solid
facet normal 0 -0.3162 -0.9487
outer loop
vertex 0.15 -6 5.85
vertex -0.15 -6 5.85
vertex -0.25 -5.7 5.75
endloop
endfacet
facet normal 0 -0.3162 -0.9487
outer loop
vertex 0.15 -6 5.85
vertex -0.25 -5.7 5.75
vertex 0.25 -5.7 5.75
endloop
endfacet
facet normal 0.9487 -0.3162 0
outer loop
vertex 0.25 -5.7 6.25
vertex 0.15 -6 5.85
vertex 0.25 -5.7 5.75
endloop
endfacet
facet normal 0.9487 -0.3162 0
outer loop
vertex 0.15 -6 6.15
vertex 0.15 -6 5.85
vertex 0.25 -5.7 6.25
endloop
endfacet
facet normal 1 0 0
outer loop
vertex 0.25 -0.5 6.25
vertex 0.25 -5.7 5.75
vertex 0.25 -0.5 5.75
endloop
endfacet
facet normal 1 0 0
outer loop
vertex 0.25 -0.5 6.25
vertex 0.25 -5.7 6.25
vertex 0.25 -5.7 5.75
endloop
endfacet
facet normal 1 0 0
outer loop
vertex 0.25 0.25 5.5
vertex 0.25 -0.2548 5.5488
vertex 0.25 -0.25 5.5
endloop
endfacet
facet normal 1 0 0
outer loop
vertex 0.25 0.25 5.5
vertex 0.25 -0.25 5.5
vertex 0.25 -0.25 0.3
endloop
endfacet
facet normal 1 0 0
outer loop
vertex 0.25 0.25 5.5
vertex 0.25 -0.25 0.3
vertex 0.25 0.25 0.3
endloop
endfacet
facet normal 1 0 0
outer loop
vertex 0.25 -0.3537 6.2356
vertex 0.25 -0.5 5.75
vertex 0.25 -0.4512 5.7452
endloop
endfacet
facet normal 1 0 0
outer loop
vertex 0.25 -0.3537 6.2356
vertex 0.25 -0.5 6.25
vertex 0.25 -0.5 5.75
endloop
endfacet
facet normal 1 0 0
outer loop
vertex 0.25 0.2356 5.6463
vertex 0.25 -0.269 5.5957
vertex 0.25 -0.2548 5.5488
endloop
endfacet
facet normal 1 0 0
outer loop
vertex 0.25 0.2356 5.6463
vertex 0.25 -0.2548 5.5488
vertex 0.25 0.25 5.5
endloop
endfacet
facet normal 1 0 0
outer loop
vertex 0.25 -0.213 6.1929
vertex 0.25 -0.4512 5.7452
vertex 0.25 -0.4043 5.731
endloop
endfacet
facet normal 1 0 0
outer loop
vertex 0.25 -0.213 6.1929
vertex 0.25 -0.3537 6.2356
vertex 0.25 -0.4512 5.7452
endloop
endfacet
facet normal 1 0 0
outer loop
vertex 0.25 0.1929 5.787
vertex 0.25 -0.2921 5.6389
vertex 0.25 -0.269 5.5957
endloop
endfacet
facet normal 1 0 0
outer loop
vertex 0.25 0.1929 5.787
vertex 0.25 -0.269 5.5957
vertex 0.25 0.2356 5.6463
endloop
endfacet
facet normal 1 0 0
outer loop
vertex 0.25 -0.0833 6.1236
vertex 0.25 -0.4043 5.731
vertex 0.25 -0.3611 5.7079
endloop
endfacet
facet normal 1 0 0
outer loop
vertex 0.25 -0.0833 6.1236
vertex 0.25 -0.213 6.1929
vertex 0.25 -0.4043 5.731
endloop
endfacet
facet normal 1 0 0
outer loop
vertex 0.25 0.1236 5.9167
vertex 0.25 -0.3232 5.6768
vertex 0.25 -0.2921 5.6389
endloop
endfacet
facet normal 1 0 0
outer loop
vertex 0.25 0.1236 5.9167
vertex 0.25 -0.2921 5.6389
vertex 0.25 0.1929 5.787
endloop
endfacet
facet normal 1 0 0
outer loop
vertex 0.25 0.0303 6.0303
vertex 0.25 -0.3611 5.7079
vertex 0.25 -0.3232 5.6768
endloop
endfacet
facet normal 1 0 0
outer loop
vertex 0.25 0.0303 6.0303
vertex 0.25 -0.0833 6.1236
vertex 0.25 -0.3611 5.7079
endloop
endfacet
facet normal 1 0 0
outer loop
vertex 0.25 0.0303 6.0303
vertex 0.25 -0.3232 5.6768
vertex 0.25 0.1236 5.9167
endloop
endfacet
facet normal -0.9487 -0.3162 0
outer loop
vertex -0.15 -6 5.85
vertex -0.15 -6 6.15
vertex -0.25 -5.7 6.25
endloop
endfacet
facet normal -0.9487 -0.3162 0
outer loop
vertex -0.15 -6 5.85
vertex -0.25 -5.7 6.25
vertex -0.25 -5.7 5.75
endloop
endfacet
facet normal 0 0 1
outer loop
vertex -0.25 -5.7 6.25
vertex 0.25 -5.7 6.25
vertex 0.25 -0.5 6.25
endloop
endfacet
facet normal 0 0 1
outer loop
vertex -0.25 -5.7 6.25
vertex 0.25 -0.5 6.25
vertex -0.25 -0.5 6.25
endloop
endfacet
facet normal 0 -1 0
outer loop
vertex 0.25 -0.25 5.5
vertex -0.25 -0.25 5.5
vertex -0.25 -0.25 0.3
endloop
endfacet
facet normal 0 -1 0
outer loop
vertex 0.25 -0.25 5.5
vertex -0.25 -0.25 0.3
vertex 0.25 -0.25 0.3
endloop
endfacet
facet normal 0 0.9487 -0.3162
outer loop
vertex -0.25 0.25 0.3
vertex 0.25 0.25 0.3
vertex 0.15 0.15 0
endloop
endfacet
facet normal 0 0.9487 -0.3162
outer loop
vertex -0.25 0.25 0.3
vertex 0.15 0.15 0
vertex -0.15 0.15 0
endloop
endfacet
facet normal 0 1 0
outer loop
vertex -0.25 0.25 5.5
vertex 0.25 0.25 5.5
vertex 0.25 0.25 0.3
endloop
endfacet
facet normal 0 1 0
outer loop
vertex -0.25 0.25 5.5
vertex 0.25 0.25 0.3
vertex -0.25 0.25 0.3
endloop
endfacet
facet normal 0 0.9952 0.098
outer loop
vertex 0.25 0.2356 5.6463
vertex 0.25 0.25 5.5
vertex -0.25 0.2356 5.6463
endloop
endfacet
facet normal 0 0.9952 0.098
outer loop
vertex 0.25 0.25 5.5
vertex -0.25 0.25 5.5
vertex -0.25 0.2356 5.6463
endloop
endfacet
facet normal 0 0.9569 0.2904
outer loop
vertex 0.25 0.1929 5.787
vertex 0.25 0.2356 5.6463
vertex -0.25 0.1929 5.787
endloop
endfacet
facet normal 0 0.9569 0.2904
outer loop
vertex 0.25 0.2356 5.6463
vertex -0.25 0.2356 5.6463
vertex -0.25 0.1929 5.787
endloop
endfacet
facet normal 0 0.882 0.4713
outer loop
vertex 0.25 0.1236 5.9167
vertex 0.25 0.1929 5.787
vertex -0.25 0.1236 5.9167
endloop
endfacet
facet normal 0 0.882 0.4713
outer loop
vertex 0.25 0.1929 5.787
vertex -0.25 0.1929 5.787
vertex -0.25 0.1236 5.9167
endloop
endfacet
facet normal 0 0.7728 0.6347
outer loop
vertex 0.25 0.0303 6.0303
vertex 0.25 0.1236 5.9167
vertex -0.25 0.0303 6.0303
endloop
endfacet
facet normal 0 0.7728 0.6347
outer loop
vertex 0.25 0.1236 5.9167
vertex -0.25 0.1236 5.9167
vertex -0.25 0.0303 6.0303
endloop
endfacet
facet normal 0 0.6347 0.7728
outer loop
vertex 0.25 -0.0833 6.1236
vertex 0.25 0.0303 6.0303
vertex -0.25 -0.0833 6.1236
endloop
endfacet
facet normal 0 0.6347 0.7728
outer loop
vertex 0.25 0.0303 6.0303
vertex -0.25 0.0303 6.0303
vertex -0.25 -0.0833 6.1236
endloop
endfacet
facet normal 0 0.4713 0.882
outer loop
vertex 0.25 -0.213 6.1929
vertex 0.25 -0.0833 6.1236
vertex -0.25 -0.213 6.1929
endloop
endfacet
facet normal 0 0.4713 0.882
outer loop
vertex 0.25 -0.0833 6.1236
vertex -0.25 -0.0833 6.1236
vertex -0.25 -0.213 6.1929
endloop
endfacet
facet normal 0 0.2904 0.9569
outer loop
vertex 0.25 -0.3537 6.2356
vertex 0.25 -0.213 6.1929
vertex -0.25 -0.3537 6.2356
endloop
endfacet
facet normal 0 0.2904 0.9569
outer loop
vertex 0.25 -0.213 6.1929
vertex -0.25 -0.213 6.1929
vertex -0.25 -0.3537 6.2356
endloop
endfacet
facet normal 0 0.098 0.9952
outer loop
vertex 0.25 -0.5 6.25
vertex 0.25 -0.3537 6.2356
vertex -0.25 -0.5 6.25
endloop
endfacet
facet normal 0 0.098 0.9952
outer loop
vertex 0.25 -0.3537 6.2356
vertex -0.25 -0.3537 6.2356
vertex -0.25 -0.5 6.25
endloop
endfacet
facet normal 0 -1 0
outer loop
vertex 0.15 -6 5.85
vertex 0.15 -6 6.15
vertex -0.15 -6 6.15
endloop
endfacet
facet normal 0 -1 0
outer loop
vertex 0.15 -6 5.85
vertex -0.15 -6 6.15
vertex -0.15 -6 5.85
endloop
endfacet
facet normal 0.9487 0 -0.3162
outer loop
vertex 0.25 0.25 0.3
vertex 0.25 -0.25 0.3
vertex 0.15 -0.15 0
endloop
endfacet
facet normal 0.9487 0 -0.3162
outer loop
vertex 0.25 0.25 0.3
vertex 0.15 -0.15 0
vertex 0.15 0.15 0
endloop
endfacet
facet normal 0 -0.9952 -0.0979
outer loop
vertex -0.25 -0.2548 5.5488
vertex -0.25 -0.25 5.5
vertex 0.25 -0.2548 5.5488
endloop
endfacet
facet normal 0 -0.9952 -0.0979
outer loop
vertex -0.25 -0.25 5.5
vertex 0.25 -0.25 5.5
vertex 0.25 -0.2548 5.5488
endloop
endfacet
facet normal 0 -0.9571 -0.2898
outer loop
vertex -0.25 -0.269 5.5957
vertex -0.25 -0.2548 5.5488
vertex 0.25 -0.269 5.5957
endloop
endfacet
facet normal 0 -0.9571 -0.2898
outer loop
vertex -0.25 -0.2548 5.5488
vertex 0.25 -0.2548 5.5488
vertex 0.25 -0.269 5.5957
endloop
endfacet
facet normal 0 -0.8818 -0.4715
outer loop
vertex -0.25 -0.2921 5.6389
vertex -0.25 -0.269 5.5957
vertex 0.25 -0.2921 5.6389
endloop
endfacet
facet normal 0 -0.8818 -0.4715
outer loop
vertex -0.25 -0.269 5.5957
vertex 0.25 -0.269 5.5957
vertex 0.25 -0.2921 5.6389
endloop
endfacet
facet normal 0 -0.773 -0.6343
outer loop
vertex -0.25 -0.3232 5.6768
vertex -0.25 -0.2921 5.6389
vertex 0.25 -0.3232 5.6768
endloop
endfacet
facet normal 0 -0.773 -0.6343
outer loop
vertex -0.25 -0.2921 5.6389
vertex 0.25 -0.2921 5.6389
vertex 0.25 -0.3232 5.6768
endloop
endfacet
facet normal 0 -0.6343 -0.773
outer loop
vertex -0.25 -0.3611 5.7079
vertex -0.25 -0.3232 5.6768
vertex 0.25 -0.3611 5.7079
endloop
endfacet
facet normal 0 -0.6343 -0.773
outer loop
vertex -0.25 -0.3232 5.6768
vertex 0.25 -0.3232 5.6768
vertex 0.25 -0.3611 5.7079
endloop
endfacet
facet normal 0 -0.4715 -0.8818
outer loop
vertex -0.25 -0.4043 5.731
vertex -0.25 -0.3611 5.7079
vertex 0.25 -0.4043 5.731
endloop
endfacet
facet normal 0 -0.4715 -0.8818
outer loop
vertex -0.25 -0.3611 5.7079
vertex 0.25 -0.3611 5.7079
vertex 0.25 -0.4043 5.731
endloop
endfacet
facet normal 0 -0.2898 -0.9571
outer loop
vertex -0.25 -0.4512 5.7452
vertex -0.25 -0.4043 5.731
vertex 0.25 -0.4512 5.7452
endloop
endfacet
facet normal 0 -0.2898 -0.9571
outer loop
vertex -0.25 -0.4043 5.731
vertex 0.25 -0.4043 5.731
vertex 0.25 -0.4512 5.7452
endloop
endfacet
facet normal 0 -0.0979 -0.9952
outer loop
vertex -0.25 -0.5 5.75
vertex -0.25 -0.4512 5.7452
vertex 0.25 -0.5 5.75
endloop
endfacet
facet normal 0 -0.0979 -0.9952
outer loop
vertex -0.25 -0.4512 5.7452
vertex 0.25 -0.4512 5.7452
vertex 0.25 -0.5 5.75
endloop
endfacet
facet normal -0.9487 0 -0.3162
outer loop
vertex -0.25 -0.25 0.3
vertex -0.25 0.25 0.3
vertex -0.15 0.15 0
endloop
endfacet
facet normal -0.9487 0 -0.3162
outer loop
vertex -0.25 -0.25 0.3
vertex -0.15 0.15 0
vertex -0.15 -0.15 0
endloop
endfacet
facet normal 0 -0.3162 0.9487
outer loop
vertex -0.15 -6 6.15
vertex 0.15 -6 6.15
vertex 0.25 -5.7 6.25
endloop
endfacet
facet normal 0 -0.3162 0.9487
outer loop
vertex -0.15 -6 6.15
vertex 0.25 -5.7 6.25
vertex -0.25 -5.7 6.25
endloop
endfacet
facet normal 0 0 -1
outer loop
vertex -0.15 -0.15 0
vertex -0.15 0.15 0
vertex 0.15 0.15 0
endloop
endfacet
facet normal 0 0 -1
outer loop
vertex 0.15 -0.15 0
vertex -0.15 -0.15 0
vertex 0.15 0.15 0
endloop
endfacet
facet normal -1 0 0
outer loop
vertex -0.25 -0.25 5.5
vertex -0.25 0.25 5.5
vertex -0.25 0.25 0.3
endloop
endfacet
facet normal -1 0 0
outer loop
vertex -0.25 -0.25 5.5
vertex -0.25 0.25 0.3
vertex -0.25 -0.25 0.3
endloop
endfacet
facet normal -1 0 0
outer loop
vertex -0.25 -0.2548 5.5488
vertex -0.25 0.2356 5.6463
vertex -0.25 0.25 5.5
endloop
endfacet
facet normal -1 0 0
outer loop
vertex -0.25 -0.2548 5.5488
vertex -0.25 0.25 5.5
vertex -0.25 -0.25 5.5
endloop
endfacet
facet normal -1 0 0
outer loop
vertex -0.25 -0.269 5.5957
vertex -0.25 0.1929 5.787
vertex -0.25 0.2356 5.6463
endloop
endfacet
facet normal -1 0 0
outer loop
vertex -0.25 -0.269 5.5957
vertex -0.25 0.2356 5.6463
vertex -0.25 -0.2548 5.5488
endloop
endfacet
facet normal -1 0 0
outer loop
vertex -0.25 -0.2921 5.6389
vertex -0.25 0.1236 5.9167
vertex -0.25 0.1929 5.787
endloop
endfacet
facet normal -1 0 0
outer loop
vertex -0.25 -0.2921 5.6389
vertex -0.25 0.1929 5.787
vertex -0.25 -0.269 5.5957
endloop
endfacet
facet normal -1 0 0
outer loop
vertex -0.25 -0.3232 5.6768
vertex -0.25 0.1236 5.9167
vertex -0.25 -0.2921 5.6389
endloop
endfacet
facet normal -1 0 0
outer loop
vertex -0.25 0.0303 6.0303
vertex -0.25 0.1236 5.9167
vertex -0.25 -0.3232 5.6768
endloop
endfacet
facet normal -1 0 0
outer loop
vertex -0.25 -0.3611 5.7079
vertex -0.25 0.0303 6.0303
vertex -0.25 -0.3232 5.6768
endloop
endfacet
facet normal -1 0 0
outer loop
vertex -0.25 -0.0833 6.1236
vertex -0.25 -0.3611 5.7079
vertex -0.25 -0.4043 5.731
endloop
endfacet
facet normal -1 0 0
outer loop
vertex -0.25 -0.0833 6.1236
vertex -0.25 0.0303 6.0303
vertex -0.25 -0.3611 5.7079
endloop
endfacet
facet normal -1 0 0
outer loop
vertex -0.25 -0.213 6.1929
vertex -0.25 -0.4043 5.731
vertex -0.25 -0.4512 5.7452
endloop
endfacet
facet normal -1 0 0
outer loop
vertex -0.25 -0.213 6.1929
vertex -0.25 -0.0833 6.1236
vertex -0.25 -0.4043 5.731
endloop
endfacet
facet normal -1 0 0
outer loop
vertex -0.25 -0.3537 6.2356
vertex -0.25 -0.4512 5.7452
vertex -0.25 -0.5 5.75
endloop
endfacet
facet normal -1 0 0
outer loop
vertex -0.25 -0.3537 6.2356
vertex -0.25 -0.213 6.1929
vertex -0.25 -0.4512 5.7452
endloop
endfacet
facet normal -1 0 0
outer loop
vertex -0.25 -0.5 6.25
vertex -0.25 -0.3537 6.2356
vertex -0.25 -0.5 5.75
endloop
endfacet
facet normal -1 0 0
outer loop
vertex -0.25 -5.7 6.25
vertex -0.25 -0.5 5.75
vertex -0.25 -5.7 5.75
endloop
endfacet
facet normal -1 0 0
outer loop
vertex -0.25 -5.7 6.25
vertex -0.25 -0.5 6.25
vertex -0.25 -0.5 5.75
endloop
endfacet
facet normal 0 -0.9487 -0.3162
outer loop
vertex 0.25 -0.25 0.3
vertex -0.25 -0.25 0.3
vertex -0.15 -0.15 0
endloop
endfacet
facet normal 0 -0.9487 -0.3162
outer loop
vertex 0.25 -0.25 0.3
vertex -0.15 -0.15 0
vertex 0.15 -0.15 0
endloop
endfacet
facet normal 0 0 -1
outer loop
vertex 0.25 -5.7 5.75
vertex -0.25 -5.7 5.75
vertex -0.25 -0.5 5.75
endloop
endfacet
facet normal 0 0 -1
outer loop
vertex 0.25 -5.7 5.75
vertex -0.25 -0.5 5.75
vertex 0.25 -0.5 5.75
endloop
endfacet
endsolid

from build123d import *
from OCP.BRepFilletAPI import BRepFilletAPI_MakeChamfer

# Parameters (mm, degrees)
ESBO_O2_W      = 0.5
ESBO_O2_H      = 0.5
CHANFRO1_SIZE  = 0.1
CHANFRO1_SIZE2 = 0.3
CHANFRO2_SIZE  = 0.3
CHANFRO2_SIZE2 = 0.1


with BuildPart() as part:
    # Varredura1: sweep along a path in Esboço1
    with BuildLine(Plane(origin=(0, 0, 0), x_dir=(0, 0, -1), z_dir=(1, 0, 0))) as varredura1_path:
        Line((0, 0), (-5.5, 0))
        ThreePointArc((-5.5, 0), (-5.853553391, -0.146446609), (-6, -0.5))
        Line((-6, -0.5), (-6, -6))
    # Esboço2 → Varredura1 (sweep)
    with BuildSketch(Plane.XY):
        Rectangle(ESBO_O2_W, ESBO_O2_H)
    sweep(path=varredura1_path.line)

    # Chanfro1
    chanfro1_edges = [part.edges().sort_by_distance(p)[0] for p in [
        (0, 0.25, 0),
        (-0.25, 0, 0),
        (0, -0.25, 0),
        (0.25, 0, 0),
    ]]
    chanfro1_side = [part.faces().sort_by_distance(p)[0] for p in [
        (0, 0, 0),
    ]]
    chamfer(chanfro1_edges, length=CHANFRO1_SIZE, length2=CHANFRO1_SIZE2, reference=chanfro1_side[0])

    # Chanfro2: one chamfer whose edges measure the first distance from different faces: ONE call of the kernel's chamfer builder (chamfer() names one face for all edges)
    chanfro2_edges_1 = [part.edges().sort_by_distance(p)[0] for p in [
        (0.25, -6, 6),
    ]]
    chanfro2_side_1 = [part.faces().sort_by_distance(p)[0] for p in [
        (0.25, -0.163706895, 2.9),
    ]]
    chanfro2_edges_2 = [part.edges().sort_by_distance(p)[0] for p in [
        (0, -6, 6.25),
    ]]
    chanfro2_side_2 = [part.faces().sort_by_distance(p)[0] for p in [
        (0, -3.25, 6.25),
    ]]
    chanfro2_edges_3 = [part.edges().sort_by_distance(p)[0] for p in [
        (-0.25, -6, 6),
    ]]
    chanfro2_side_3 = [part.faces().sort_by_distance(p)[0] for p in [
        (-0.25, 0.163706895, 2.9),
    ]]
    chanfro2_edges_4 = [part.edges().sort_by_distance(p)[0] for p in [
        (0, -6, 5.75),
    ]]
    chanfro2_side_4 = [part.faces().sort_by_distance(p)[0] for p in [
        (0, -3.25, 5.75),
    ]]
    chanfro2 = BRepFilletAPI_MakeChamfer(part.part.solid().wrapped)
    for e in chanfro2_edges_1:
        chanfro2.Add(CHANFRO2_SIZE, CHANFRO2_SIZE2, e.wrapped, chanfro2_side_1[0].wrapped)  # the first distance lies on this face
    for e in chanfro2_edges_2:
        chanfro2.Add(CHANFRO2_SIZE, CHANFRO2_SIZE2, e.wrapped, chanfro2_side_2[0].wrapped)  # the first distance lies on this face
    for e in chanfro2_edges_3:
        chanfro2.Add(CHANFRO2_SIZE, CHANFRO2_SIZE2, e.wrapped, chanfro2_side_3[0].wrapped)  # the first distance lies on this face
    for e in chanfro2_edges_4:
        chanfro2.Add(CHANFRO2_SIZE, CHANFRO2_SIZE2, e.wrapped, chanfro2_side_4[0].wrapped)  # the first distance lies on this face
    add(Compound.cast(chanfro2.Shape()), mode=Mode.REPLACE)


solid = part.part
